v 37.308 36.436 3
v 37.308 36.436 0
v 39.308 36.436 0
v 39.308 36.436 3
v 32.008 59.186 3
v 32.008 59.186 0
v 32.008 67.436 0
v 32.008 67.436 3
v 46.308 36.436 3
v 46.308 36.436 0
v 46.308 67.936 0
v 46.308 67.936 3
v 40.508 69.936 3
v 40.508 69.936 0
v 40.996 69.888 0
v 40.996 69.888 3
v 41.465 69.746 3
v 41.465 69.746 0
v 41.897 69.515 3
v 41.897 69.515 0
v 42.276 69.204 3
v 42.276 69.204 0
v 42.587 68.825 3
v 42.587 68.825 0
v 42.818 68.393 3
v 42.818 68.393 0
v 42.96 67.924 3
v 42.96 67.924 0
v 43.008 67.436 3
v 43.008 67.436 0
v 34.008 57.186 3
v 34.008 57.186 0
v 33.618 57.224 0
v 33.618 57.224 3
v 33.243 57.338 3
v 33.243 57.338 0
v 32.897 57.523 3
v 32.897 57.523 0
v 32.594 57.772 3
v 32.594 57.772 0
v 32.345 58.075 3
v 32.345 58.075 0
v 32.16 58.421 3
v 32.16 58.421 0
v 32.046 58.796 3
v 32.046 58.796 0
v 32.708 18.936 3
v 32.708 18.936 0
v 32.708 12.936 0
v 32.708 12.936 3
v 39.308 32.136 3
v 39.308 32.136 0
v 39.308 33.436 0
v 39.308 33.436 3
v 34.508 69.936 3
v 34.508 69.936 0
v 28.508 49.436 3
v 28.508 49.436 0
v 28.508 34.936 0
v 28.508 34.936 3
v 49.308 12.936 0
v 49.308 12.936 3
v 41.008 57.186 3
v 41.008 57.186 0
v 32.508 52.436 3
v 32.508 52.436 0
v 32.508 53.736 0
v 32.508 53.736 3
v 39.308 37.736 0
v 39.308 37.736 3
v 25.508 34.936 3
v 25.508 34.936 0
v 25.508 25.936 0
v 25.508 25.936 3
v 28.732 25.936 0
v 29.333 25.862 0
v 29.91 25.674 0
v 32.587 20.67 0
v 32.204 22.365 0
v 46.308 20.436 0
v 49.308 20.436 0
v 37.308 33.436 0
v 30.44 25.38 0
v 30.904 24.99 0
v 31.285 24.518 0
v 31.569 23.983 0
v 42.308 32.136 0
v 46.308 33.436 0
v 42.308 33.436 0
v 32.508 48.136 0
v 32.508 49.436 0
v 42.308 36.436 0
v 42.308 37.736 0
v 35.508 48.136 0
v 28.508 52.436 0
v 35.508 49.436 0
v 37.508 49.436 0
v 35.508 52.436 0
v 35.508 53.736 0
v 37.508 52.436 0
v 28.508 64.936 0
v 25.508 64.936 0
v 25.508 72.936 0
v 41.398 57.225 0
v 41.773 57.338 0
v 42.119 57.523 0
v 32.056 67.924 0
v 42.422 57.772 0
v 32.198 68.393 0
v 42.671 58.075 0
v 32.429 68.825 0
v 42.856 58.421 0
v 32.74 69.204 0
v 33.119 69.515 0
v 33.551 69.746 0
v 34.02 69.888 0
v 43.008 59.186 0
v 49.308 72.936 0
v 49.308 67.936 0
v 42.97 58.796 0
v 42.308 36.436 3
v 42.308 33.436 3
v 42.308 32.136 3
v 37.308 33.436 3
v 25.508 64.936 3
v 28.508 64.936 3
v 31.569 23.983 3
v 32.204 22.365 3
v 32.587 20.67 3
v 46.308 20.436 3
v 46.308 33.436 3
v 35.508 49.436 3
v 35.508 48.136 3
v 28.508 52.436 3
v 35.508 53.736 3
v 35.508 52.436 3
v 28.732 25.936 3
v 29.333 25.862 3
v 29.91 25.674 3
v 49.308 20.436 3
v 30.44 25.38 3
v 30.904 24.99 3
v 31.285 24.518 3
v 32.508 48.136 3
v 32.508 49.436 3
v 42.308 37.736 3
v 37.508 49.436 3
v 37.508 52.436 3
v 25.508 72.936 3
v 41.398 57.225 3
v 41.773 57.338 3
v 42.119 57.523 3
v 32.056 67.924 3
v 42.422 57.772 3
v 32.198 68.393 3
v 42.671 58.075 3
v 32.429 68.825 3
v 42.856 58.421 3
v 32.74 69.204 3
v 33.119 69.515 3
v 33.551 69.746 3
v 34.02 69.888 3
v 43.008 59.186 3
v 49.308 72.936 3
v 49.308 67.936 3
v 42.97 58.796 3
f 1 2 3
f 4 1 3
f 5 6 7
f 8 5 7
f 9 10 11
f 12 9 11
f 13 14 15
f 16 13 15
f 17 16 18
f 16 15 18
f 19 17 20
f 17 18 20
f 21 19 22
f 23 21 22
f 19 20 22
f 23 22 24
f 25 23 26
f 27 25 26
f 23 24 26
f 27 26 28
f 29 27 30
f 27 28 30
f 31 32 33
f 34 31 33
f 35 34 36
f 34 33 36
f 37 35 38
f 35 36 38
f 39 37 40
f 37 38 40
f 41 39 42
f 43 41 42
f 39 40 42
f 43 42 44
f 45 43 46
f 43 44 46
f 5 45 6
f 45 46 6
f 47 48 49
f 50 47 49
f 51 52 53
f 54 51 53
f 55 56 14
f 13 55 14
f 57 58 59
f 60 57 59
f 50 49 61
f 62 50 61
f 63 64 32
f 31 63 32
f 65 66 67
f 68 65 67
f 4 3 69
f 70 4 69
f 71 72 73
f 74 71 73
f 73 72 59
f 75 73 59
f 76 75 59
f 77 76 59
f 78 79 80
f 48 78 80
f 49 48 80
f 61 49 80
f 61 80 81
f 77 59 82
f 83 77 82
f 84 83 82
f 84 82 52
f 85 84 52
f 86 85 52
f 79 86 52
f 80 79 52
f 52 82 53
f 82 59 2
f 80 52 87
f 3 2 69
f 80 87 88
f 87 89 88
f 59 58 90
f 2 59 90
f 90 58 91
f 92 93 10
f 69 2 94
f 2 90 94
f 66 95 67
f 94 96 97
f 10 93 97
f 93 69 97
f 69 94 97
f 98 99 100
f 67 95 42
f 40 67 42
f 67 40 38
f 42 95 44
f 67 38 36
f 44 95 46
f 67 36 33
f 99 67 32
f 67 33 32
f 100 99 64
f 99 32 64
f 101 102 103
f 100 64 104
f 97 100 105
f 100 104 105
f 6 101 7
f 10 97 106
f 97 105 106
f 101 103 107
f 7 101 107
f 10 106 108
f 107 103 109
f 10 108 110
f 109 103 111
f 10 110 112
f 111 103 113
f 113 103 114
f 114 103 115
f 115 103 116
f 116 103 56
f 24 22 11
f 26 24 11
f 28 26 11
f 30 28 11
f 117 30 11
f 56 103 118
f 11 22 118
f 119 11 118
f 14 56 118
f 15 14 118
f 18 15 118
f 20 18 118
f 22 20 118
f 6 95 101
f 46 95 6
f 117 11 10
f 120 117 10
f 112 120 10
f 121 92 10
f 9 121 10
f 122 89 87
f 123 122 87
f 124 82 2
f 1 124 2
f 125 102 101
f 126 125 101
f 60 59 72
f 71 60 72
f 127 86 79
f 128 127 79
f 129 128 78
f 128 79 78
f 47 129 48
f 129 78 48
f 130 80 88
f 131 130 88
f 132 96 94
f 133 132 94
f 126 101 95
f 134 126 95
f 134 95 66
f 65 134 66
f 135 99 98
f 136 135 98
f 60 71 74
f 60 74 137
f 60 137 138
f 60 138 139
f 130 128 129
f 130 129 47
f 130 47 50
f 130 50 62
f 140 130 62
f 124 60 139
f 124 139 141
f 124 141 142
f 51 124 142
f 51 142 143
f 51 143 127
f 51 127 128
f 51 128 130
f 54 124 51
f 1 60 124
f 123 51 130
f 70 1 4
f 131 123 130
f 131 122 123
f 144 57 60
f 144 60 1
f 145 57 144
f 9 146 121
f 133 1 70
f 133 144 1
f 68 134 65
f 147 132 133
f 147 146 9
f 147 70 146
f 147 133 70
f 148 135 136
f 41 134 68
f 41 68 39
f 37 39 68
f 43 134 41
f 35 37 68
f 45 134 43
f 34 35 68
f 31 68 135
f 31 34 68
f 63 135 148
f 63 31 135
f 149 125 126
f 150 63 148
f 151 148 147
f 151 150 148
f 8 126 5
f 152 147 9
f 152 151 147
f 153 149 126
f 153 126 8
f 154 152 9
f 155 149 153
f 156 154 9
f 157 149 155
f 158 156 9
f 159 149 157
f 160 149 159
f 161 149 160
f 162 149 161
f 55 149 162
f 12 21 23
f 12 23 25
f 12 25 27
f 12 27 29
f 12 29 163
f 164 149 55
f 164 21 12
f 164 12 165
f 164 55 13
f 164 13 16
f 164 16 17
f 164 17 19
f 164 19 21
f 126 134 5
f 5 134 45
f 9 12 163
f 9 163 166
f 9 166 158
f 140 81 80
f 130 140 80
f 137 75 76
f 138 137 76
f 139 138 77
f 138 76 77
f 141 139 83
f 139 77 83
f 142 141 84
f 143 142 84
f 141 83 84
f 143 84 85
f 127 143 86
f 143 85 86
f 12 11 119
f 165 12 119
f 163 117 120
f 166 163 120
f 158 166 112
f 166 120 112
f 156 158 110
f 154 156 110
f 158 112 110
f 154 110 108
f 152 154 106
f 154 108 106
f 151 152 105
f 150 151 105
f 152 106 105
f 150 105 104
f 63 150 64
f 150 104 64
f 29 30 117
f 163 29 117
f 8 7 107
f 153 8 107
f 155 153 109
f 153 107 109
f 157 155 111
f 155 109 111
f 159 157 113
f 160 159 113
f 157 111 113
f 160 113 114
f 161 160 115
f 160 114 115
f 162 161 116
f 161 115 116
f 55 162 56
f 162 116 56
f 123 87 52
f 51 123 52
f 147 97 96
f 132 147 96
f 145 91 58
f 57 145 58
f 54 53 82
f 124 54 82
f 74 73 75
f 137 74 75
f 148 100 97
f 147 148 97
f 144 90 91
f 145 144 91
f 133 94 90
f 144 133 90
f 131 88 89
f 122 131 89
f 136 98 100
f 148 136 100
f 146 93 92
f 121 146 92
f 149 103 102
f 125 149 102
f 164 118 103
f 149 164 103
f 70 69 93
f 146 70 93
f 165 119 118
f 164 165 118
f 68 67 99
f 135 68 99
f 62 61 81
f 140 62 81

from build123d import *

# Parameters (mm, degrees)
BOSS_EXTRUDE1_DEPTH = 3


with BuildPart() as part:
    # Model → Boss-Extrude1 (new body)
    with BuildSketch(Plane.XY):
        with BuildLine():
            Line((37.008, 72.936), (25.508, 72.936))
            Line((25.508, 72.936), (25.508, 64.936))
            Line((25.508, 64.936), (28.508, 64.936))
            Line((28.508, 64.936), (28.508, 52.436))
            Line((28.508, 52.436), (32.508, 52.436))
            Line((32.508, 52.436), (32.508, 53.736))
            Line((32.508, 53.736), (35.508, 53.736))
            Line((35.508, 53.736), (35.508, 52.436))
            Line((35.508, 52.436), (37.508, 52.436))
            Line((37.508, 52.436), (37.508, 49.436))
            Line((37.508, 49.436), (35.508, 49.436))
            Line((35.508, 49.436), (35.508, 48.136))
            Line((35.508, 48.136), (32.508, 48.136))
            Line((32.508, 48.136), (32.508, 49.436))
            Line((32.508, 49.436), (28.508, 49.436))
            Line((28.508, 49.436), (28.508, 34.936))
            Line((28.508, 34.936), (25.508, 34.936))
            Line((25.508, 34.936), (25.508, 30.436))
            Line((25.508, 30.436), (25.508, 25.936))
            Line((25.508, 25.936), (28.7315, 25.936))
            ThreePointArc((28.7315, 25.936), (30.43997083, 25.380193402), (31.569029282, 23.982688281))
            ThreePointArc((31.569029282, 23.982688281), (32.427770148, 21.524625278), (32.708, 18.936))
            Line((32.708, 18.936), (32.708, 12.936))
            Line((32.708, 12.936), (49.308, 12.936))
            Line((49.308, 12.936), (49.308, 20.436))
            Line((49.308, 20.436), (46.308, 20.436))
            Line((46.308, 20.436), (46.308, 33.436))
            Line((46.308, 33.436), (42.308, 33.436))
            Line((42.308, 33.436), (42.308, 32.136))
            Line((42.308, 32.136), (39.308, 32.136))
            Line((39.308, 32.136), (39.308, 33.436))
            Line((39.308, 33.436), (37.308, 33.436))
            Line((37.308, 33.436), (37.308, 36.436))
            Line((37.308, 36.436), (39.308, 36.436))
            Line((39.308, 36.436), (39.308, 37.736))
            Line((39.308, 37.736), (42.308, 37.736))
            Line((42.308, 37.736), (42.308, 36.436))
            Line((42.308, 36.436), (46.308, 36.436))
            Line((46.308, 36.436), (46.308, 67.936))
            Line((46.308, 67.936), (49.308, 67.936))
            Line((49.308, 67.936), (49.308, 72.936))
            Line((49.308, 72.936), (37.008, 72.936))
        make_face()
        with BuildLine():
            Line((41.008, 57.1861), (34.008, 57.1861))
            ThreePointArc((34.008, 57.1861), (32.593735358, 57.771764643), (32.008, 59.186))
            Line((32.008, 59.186), (32.008, 67.436))
            ThreePointArc((32.008, 67.436), (32.7402, 69.2038), (34.508, 69.936))
            Line((34.508, 69.936), (40.508, 69.936))
            ThreePointArc((40.508, 69.936), (42.27578125, 69.20378125), (43.008, 67.436))
            Line((43.008, 67.436), (43.008, 59.186))
            ThreePointArc((43.008, 59.186), (42.422214645, 57.771814644), (41.008, 57.1861))
        make_face(mode=Mode.SUBTRACT)
    extrude(amount=BOSS_EXTRUDE1_DEPTH)


solid = part.part
